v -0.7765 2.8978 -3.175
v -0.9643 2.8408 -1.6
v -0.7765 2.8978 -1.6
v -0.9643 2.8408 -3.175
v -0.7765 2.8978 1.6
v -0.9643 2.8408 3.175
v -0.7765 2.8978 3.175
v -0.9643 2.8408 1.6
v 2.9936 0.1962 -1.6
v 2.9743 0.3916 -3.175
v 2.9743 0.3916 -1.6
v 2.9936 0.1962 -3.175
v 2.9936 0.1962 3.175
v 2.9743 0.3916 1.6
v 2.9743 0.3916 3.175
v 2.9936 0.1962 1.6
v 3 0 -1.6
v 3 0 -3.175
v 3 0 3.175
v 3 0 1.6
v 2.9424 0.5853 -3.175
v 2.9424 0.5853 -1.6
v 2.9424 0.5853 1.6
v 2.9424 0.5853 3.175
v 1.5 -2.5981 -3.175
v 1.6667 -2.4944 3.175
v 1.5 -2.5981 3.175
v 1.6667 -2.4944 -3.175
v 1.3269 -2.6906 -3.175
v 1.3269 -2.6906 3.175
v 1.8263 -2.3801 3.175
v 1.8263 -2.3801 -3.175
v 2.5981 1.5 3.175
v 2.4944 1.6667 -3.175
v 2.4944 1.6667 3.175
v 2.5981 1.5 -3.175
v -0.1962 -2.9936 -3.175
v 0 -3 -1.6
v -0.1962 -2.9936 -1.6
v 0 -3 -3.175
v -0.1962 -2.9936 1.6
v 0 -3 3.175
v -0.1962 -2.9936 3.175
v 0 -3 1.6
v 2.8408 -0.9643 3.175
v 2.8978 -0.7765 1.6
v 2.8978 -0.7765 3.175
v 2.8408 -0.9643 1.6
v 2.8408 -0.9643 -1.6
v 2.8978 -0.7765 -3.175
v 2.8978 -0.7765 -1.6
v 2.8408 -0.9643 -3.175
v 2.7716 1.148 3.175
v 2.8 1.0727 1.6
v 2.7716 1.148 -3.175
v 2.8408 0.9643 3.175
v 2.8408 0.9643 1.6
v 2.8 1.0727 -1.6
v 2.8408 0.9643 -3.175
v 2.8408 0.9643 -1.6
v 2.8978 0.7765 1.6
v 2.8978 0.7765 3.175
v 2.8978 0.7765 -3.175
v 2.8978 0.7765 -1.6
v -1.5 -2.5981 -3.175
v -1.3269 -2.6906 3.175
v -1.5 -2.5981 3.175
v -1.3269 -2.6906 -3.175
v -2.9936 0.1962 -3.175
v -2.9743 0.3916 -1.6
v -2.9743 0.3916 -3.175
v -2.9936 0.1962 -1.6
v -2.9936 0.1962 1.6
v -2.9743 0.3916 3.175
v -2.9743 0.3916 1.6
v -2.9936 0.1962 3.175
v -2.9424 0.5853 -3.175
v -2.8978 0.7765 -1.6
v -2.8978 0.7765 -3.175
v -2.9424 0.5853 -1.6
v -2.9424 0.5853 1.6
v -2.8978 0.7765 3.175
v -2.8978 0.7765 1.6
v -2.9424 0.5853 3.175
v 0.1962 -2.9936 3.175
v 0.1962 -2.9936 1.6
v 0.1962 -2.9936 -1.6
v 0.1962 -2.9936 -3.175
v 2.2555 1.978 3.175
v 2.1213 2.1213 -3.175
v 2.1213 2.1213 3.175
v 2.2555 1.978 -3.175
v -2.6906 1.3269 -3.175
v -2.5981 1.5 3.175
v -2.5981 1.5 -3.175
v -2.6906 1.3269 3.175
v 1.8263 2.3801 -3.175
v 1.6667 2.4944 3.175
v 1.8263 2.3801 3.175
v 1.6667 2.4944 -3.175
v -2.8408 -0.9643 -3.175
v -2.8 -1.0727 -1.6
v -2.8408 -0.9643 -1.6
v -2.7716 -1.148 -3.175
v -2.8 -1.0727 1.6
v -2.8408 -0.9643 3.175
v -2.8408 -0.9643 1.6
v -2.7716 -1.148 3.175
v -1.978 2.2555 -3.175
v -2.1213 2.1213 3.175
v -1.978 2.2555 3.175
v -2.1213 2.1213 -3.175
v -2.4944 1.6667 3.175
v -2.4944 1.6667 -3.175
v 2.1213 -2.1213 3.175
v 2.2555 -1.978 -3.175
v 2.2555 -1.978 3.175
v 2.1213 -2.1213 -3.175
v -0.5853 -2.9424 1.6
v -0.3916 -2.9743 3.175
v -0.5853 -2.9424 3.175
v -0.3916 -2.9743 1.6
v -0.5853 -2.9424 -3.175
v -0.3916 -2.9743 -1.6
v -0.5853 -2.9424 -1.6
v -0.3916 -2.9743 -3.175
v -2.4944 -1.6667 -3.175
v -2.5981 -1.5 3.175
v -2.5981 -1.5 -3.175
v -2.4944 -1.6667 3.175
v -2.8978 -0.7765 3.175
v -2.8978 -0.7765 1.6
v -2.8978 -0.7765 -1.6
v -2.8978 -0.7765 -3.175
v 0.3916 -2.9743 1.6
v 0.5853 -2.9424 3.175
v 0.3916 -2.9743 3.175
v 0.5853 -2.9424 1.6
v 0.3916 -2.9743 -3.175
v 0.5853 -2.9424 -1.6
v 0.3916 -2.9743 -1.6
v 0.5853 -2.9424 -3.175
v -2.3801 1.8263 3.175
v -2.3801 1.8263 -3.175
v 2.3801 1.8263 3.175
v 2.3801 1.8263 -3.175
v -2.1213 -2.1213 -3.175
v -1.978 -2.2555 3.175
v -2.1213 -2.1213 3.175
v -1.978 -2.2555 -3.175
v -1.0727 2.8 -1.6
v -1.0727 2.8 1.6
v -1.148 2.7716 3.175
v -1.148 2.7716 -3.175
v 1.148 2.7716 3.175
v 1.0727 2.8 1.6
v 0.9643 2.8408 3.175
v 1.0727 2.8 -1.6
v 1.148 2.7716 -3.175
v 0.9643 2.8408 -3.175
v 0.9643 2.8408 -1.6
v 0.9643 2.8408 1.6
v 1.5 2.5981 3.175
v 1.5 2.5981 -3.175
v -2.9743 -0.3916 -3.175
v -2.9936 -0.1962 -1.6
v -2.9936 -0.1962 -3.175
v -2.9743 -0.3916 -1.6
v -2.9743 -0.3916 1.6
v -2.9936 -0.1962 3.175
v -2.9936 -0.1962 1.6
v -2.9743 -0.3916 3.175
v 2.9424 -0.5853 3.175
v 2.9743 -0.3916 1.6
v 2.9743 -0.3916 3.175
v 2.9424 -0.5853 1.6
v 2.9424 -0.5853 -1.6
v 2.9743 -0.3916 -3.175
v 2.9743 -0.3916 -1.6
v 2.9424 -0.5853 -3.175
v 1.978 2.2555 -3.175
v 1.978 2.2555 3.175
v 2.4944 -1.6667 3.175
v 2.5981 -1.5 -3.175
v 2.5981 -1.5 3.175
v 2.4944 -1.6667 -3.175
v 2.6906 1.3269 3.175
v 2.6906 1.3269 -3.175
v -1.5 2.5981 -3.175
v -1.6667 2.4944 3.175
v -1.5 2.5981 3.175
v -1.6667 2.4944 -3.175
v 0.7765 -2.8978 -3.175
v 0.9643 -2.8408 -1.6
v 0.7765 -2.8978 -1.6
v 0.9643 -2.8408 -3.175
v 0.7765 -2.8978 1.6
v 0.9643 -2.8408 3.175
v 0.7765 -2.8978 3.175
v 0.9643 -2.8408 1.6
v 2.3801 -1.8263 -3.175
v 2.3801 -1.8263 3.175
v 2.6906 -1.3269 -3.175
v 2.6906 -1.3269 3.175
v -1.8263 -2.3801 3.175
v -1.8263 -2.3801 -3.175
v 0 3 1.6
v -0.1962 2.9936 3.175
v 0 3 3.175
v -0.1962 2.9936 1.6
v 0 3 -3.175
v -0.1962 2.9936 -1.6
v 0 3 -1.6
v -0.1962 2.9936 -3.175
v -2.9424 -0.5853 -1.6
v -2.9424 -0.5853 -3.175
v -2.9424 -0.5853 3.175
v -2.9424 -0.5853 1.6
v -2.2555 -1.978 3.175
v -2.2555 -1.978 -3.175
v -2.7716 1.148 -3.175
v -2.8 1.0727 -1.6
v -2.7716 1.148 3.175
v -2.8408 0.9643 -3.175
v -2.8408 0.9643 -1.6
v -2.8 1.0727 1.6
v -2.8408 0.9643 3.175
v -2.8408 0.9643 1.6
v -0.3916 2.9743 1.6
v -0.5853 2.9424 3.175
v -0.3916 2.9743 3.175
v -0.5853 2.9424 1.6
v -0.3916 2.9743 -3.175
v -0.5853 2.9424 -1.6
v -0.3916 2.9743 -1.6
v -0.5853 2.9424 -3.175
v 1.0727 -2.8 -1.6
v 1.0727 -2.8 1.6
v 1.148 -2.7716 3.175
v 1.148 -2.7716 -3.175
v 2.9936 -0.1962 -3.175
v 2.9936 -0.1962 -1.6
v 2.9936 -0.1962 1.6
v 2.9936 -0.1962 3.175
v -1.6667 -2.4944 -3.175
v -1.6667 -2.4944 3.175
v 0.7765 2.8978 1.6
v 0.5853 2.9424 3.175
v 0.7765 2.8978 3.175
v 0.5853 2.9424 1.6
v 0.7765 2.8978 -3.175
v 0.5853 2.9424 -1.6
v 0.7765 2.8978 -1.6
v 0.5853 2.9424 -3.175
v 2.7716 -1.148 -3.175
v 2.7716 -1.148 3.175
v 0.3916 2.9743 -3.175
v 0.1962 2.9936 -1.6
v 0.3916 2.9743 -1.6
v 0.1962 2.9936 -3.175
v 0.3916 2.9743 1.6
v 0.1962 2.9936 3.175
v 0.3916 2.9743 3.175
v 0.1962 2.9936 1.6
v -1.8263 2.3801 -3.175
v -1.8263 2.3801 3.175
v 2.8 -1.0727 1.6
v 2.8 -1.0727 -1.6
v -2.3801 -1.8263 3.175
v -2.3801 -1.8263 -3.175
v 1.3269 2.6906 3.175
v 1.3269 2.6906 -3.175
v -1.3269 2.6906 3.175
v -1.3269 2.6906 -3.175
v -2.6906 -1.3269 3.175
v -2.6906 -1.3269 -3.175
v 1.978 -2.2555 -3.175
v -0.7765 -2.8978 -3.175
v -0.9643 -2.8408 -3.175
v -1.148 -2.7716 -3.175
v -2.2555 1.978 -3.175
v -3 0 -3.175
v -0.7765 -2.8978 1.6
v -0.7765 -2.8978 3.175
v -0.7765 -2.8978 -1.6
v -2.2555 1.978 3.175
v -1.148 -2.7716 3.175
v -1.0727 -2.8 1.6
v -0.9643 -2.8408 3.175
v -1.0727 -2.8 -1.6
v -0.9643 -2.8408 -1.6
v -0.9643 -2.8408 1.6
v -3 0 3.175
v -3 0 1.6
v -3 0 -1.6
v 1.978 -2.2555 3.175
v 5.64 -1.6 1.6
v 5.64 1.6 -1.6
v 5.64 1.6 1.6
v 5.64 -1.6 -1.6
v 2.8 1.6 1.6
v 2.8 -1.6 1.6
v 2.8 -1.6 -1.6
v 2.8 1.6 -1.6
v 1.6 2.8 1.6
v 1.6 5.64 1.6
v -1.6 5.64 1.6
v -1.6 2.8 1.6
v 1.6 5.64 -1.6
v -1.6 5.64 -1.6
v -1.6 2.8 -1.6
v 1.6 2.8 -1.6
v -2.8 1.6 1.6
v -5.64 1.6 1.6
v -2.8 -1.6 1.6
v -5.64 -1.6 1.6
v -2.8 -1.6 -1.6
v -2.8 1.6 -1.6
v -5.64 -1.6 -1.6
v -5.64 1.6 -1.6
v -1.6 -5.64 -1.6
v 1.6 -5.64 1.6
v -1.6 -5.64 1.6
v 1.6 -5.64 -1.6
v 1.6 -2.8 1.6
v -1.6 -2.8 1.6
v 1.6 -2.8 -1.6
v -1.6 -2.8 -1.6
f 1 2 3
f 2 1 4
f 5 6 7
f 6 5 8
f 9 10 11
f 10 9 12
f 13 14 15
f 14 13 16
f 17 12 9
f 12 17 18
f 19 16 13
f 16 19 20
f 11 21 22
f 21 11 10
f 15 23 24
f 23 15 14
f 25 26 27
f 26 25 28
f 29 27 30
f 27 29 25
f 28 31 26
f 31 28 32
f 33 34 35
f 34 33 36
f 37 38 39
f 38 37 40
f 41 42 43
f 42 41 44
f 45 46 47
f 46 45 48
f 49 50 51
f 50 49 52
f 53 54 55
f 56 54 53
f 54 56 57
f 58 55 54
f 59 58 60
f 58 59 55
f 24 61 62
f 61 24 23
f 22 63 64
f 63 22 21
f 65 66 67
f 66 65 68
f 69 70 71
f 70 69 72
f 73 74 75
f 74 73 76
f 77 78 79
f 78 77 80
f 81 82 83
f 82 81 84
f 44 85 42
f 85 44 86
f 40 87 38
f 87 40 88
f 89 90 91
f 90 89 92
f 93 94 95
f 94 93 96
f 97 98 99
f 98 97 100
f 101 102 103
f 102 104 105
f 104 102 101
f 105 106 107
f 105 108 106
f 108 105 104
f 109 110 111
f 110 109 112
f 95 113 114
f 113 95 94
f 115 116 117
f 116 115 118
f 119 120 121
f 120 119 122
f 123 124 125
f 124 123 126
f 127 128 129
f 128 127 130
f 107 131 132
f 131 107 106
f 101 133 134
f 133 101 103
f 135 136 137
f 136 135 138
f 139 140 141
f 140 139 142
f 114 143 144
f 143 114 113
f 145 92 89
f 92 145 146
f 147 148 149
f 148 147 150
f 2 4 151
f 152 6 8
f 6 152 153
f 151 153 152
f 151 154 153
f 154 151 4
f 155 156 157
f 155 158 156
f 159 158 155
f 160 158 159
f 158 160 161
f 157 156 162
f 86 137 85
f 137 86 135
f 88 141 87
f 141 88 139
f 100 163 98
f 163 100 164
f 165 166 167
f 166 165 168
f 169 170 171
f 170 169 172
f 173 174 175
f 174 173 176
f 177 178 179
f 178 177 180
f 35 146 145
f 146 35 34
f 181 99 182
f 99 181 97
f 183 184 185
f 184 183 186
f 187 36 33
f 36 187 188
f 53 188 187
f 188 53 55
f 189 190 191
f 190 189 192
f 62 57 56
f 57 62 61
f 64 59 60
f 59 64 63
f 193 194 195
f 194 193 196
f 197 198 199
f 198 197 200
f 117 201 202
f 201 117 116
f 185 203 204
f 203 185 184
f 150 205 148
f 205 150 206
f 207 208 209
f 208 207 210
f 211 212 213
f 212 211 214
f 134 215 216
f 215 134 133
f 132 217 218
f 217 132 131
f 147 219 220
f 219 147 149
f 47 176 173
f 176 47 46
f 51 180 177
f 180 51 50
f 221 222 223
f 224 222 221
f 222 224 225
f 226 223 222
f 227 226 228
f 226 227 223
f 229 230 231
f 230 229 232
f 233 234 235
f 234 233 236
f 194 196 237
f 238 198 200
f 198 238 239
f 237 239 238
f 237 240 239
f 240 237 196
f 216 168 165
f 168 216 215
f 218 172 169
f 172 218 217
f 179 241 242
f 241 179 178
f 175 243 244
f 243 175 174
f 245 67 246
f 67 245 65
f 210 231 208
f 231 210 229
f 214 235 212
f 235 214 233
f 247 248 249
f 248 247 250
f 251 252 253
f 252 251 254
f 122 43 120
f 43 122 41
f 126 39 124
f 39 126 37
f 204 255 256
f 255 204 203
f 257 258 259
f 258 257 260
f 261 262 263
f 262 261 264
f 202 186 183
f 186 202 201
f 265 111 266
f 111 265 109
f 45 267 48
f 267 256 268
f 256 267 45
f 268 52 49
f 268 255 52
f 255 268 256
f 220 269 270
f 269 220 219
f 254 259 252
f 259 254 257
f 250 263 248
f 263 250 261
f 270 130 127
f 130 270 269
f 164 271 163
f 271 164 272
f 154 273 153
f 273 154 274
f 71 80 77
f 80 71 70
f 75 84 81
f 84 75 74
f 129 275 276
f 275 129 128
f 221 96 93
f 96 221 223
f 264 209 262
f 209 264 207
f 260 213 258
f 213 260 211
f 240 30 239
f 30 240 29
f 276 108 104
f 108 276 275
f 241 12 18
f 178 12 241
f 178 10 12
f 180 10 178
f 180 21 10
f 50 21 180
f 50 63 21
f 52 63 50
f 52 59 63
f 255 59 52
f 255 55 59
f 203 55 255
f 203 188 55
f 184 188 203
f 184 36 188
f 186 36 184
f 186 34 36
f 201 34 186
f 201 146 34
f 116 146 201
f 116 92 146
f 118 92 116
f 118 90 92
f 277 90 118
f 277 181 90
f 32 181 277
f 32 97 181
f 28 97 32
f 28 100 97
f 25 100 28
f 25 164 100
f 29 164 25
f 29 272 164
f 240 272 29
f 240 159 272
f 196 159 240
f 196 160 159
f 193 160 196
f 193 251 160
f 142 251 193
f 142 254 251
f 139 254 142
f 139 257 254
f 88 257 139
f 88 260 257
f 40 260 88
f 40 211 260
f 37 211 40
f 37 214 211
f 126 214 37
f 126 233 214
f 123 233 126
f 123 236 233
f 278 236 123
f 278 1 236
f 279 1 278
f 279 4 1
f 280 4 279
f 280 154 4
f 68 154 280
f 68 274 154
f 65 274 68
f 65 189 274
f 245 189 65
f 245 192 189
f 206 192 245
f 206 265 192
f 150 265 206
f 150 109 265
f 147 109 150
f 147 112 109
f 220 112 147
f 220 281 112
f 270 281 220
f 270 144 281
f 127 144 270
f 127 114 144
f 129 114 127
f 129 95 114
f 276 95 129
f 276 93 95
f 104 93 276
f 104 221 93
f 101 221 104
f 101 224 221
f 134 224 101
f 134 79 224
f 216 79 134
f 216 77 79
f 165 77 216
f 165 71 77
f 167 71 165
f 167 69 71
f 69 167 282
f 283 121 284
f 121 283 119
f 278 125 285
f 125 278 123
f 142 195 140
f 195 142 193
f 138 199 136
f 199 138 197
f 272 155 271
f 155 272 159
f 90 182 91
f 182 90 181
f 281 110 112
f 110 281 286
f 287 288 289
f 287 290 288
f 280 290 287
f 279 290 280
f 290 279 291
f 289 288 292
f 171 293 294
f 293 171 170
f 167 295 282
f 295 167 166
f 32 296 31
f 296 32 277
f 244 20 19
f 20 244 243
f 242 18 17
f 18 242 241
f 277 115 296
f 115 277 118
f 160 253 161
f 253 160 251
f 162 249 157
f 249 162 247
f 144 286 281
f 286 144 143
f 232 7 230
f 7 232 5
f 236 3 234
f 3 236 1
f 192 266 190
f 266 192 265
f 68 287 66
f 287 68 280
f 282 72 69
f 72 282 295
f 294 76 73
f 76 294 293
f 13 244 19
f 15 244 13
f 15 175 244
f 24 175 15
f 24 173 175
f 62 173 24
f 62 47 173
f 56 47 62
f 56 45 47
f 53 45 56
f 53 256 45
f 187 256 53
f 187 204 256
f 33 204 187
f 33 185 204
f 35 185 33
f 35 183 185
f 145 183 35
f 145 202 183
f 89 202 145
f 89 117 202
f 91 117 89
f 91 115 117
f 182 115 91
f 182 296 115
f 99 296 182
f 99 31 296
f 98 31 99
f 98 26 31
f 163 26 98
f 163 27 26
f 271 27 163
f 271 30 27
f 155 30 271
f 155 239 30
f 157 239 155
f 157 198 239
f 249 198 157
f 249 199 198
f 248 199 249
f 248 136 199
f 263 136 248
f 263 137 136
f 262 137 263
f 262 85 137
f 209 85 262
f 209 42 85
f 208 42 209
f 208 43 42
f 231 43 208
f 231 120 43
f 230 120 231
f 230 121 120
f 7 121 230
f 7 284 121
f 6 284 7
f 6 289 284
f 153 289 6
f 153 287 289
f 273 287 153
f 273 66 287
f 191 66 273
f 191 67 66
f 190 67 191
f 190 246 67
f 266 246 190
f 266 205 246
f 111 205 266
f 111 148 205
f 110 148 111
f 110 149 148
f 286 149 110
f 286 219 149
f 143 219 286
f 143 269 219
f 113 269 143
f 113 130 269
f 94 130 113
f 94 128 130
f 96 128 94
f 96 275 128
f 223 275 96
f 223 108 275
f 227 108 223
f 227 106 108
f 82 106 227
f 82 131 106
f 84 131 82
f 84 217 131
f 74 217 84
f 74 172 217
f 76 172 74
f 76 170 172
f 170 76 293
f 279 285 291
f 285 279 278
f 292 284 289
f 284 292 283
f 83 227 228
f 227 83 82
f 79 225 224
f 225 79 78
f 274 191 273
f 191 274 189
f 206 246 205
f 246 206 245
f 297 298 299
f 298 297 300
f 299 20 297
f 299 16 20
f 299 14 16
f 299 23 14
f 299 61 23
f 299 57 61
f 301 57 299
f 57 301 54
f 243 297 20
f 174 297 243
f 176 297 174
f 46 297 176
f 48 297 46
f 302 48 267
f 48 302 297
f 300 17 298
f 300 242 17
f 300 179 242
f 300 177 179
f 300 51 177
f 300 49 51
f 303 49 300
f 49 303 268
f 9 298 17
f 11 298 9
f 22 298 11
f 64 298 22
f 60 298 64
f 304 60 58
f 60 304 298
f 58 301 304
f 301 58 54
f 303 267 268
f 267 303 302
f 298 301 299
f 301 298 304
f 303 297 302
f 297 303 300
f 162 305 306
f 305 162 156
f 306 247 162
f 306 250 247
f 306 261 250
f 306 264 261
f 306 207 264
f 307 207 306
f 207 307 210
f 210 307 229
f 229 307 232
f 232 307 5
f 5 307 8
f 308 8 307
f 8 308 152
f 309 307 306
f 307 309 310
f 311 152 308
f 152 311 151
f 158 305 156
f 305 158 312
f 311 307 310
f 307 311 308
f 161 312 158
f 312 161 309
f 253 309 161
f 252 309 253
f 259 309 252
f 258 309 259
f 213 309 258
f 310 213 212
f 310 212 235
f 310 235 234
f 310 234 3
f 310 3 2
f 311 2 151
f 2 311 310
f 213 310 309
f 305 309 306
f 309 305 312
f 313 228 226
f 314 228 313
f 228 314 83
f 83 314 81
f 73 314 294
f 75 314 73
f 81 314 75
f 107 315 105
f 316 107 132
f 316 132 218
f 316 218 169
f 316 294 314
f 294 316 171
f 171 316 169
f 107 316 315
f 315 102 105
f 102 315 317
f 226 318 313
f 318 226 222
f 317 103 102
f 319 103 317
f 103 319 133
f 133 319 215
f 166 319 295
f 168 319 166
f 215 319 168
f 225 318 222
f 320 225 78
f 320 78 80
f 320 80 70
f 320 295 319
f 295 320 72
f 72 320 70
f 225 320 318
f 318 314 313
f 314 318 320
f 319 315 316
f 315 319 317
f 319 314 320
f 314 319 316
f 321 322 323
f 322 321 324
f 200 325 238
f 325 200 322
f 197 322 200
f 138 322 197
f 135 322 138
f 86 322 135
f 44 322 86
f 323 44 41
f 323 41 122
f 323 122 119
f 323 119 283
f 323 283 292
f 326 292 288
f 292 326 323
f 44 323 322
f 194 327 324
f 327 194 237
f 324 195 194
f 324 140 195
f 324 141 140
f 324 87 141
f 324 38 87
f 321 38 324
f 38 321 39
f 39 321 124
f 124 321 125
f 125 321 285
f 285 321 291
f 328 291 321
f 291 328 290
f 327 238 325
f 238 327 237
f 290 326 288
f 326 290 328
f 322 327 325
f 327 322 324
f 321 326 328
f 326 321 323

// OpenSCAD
// Symmetric cross-shaped hub (one connected solid)
// Target bounding box: 11.7 x 11.7 x 6.3 mm

$fn = 96;

// Bounding box (reference)
bbox_X = 11.68;
bbox_Y = 11.68;
bbox_Z = 6.35;

// Core (circular hub)
core_d = 6.0;
core_h = bbox_Z;

// Tabs (lugs)
tab_len_radial = (bbox_X - core_d) / 2;   // ensures overall X/Y matches bbox
tab_w_tangential = 3.2;
tab_h = 3.2;

// Small overlap to guarantee watertight union
overlap = 0.2;

// Tabs centered around cylinder mid-height (as in views)
tab_z = 0;

module core() {
    cylinder(d=core_d, h=core_h, center=true);
}

module tab_at_angle(a) {
    // Place tab so its inner face overlaps into the core by "overlap"
    // Inner edge radius = core_d/2 - overlap
    // Tab center radius = (core_d/2 - overlap) + tab_len_radial/2
    rotate([0, 0, a])
        translate([core_d/2 + tab_len_radial/2 - overlap, 0, tab_z])
            cube([tab_len_radial, tab_w_tangential, tab_h], center=true);
}

union() {
    core();
    tab_at_angle(0);
    tab_at_angle(90);
    tab_at_angle(180);
    tab_at_angle(270);
}
